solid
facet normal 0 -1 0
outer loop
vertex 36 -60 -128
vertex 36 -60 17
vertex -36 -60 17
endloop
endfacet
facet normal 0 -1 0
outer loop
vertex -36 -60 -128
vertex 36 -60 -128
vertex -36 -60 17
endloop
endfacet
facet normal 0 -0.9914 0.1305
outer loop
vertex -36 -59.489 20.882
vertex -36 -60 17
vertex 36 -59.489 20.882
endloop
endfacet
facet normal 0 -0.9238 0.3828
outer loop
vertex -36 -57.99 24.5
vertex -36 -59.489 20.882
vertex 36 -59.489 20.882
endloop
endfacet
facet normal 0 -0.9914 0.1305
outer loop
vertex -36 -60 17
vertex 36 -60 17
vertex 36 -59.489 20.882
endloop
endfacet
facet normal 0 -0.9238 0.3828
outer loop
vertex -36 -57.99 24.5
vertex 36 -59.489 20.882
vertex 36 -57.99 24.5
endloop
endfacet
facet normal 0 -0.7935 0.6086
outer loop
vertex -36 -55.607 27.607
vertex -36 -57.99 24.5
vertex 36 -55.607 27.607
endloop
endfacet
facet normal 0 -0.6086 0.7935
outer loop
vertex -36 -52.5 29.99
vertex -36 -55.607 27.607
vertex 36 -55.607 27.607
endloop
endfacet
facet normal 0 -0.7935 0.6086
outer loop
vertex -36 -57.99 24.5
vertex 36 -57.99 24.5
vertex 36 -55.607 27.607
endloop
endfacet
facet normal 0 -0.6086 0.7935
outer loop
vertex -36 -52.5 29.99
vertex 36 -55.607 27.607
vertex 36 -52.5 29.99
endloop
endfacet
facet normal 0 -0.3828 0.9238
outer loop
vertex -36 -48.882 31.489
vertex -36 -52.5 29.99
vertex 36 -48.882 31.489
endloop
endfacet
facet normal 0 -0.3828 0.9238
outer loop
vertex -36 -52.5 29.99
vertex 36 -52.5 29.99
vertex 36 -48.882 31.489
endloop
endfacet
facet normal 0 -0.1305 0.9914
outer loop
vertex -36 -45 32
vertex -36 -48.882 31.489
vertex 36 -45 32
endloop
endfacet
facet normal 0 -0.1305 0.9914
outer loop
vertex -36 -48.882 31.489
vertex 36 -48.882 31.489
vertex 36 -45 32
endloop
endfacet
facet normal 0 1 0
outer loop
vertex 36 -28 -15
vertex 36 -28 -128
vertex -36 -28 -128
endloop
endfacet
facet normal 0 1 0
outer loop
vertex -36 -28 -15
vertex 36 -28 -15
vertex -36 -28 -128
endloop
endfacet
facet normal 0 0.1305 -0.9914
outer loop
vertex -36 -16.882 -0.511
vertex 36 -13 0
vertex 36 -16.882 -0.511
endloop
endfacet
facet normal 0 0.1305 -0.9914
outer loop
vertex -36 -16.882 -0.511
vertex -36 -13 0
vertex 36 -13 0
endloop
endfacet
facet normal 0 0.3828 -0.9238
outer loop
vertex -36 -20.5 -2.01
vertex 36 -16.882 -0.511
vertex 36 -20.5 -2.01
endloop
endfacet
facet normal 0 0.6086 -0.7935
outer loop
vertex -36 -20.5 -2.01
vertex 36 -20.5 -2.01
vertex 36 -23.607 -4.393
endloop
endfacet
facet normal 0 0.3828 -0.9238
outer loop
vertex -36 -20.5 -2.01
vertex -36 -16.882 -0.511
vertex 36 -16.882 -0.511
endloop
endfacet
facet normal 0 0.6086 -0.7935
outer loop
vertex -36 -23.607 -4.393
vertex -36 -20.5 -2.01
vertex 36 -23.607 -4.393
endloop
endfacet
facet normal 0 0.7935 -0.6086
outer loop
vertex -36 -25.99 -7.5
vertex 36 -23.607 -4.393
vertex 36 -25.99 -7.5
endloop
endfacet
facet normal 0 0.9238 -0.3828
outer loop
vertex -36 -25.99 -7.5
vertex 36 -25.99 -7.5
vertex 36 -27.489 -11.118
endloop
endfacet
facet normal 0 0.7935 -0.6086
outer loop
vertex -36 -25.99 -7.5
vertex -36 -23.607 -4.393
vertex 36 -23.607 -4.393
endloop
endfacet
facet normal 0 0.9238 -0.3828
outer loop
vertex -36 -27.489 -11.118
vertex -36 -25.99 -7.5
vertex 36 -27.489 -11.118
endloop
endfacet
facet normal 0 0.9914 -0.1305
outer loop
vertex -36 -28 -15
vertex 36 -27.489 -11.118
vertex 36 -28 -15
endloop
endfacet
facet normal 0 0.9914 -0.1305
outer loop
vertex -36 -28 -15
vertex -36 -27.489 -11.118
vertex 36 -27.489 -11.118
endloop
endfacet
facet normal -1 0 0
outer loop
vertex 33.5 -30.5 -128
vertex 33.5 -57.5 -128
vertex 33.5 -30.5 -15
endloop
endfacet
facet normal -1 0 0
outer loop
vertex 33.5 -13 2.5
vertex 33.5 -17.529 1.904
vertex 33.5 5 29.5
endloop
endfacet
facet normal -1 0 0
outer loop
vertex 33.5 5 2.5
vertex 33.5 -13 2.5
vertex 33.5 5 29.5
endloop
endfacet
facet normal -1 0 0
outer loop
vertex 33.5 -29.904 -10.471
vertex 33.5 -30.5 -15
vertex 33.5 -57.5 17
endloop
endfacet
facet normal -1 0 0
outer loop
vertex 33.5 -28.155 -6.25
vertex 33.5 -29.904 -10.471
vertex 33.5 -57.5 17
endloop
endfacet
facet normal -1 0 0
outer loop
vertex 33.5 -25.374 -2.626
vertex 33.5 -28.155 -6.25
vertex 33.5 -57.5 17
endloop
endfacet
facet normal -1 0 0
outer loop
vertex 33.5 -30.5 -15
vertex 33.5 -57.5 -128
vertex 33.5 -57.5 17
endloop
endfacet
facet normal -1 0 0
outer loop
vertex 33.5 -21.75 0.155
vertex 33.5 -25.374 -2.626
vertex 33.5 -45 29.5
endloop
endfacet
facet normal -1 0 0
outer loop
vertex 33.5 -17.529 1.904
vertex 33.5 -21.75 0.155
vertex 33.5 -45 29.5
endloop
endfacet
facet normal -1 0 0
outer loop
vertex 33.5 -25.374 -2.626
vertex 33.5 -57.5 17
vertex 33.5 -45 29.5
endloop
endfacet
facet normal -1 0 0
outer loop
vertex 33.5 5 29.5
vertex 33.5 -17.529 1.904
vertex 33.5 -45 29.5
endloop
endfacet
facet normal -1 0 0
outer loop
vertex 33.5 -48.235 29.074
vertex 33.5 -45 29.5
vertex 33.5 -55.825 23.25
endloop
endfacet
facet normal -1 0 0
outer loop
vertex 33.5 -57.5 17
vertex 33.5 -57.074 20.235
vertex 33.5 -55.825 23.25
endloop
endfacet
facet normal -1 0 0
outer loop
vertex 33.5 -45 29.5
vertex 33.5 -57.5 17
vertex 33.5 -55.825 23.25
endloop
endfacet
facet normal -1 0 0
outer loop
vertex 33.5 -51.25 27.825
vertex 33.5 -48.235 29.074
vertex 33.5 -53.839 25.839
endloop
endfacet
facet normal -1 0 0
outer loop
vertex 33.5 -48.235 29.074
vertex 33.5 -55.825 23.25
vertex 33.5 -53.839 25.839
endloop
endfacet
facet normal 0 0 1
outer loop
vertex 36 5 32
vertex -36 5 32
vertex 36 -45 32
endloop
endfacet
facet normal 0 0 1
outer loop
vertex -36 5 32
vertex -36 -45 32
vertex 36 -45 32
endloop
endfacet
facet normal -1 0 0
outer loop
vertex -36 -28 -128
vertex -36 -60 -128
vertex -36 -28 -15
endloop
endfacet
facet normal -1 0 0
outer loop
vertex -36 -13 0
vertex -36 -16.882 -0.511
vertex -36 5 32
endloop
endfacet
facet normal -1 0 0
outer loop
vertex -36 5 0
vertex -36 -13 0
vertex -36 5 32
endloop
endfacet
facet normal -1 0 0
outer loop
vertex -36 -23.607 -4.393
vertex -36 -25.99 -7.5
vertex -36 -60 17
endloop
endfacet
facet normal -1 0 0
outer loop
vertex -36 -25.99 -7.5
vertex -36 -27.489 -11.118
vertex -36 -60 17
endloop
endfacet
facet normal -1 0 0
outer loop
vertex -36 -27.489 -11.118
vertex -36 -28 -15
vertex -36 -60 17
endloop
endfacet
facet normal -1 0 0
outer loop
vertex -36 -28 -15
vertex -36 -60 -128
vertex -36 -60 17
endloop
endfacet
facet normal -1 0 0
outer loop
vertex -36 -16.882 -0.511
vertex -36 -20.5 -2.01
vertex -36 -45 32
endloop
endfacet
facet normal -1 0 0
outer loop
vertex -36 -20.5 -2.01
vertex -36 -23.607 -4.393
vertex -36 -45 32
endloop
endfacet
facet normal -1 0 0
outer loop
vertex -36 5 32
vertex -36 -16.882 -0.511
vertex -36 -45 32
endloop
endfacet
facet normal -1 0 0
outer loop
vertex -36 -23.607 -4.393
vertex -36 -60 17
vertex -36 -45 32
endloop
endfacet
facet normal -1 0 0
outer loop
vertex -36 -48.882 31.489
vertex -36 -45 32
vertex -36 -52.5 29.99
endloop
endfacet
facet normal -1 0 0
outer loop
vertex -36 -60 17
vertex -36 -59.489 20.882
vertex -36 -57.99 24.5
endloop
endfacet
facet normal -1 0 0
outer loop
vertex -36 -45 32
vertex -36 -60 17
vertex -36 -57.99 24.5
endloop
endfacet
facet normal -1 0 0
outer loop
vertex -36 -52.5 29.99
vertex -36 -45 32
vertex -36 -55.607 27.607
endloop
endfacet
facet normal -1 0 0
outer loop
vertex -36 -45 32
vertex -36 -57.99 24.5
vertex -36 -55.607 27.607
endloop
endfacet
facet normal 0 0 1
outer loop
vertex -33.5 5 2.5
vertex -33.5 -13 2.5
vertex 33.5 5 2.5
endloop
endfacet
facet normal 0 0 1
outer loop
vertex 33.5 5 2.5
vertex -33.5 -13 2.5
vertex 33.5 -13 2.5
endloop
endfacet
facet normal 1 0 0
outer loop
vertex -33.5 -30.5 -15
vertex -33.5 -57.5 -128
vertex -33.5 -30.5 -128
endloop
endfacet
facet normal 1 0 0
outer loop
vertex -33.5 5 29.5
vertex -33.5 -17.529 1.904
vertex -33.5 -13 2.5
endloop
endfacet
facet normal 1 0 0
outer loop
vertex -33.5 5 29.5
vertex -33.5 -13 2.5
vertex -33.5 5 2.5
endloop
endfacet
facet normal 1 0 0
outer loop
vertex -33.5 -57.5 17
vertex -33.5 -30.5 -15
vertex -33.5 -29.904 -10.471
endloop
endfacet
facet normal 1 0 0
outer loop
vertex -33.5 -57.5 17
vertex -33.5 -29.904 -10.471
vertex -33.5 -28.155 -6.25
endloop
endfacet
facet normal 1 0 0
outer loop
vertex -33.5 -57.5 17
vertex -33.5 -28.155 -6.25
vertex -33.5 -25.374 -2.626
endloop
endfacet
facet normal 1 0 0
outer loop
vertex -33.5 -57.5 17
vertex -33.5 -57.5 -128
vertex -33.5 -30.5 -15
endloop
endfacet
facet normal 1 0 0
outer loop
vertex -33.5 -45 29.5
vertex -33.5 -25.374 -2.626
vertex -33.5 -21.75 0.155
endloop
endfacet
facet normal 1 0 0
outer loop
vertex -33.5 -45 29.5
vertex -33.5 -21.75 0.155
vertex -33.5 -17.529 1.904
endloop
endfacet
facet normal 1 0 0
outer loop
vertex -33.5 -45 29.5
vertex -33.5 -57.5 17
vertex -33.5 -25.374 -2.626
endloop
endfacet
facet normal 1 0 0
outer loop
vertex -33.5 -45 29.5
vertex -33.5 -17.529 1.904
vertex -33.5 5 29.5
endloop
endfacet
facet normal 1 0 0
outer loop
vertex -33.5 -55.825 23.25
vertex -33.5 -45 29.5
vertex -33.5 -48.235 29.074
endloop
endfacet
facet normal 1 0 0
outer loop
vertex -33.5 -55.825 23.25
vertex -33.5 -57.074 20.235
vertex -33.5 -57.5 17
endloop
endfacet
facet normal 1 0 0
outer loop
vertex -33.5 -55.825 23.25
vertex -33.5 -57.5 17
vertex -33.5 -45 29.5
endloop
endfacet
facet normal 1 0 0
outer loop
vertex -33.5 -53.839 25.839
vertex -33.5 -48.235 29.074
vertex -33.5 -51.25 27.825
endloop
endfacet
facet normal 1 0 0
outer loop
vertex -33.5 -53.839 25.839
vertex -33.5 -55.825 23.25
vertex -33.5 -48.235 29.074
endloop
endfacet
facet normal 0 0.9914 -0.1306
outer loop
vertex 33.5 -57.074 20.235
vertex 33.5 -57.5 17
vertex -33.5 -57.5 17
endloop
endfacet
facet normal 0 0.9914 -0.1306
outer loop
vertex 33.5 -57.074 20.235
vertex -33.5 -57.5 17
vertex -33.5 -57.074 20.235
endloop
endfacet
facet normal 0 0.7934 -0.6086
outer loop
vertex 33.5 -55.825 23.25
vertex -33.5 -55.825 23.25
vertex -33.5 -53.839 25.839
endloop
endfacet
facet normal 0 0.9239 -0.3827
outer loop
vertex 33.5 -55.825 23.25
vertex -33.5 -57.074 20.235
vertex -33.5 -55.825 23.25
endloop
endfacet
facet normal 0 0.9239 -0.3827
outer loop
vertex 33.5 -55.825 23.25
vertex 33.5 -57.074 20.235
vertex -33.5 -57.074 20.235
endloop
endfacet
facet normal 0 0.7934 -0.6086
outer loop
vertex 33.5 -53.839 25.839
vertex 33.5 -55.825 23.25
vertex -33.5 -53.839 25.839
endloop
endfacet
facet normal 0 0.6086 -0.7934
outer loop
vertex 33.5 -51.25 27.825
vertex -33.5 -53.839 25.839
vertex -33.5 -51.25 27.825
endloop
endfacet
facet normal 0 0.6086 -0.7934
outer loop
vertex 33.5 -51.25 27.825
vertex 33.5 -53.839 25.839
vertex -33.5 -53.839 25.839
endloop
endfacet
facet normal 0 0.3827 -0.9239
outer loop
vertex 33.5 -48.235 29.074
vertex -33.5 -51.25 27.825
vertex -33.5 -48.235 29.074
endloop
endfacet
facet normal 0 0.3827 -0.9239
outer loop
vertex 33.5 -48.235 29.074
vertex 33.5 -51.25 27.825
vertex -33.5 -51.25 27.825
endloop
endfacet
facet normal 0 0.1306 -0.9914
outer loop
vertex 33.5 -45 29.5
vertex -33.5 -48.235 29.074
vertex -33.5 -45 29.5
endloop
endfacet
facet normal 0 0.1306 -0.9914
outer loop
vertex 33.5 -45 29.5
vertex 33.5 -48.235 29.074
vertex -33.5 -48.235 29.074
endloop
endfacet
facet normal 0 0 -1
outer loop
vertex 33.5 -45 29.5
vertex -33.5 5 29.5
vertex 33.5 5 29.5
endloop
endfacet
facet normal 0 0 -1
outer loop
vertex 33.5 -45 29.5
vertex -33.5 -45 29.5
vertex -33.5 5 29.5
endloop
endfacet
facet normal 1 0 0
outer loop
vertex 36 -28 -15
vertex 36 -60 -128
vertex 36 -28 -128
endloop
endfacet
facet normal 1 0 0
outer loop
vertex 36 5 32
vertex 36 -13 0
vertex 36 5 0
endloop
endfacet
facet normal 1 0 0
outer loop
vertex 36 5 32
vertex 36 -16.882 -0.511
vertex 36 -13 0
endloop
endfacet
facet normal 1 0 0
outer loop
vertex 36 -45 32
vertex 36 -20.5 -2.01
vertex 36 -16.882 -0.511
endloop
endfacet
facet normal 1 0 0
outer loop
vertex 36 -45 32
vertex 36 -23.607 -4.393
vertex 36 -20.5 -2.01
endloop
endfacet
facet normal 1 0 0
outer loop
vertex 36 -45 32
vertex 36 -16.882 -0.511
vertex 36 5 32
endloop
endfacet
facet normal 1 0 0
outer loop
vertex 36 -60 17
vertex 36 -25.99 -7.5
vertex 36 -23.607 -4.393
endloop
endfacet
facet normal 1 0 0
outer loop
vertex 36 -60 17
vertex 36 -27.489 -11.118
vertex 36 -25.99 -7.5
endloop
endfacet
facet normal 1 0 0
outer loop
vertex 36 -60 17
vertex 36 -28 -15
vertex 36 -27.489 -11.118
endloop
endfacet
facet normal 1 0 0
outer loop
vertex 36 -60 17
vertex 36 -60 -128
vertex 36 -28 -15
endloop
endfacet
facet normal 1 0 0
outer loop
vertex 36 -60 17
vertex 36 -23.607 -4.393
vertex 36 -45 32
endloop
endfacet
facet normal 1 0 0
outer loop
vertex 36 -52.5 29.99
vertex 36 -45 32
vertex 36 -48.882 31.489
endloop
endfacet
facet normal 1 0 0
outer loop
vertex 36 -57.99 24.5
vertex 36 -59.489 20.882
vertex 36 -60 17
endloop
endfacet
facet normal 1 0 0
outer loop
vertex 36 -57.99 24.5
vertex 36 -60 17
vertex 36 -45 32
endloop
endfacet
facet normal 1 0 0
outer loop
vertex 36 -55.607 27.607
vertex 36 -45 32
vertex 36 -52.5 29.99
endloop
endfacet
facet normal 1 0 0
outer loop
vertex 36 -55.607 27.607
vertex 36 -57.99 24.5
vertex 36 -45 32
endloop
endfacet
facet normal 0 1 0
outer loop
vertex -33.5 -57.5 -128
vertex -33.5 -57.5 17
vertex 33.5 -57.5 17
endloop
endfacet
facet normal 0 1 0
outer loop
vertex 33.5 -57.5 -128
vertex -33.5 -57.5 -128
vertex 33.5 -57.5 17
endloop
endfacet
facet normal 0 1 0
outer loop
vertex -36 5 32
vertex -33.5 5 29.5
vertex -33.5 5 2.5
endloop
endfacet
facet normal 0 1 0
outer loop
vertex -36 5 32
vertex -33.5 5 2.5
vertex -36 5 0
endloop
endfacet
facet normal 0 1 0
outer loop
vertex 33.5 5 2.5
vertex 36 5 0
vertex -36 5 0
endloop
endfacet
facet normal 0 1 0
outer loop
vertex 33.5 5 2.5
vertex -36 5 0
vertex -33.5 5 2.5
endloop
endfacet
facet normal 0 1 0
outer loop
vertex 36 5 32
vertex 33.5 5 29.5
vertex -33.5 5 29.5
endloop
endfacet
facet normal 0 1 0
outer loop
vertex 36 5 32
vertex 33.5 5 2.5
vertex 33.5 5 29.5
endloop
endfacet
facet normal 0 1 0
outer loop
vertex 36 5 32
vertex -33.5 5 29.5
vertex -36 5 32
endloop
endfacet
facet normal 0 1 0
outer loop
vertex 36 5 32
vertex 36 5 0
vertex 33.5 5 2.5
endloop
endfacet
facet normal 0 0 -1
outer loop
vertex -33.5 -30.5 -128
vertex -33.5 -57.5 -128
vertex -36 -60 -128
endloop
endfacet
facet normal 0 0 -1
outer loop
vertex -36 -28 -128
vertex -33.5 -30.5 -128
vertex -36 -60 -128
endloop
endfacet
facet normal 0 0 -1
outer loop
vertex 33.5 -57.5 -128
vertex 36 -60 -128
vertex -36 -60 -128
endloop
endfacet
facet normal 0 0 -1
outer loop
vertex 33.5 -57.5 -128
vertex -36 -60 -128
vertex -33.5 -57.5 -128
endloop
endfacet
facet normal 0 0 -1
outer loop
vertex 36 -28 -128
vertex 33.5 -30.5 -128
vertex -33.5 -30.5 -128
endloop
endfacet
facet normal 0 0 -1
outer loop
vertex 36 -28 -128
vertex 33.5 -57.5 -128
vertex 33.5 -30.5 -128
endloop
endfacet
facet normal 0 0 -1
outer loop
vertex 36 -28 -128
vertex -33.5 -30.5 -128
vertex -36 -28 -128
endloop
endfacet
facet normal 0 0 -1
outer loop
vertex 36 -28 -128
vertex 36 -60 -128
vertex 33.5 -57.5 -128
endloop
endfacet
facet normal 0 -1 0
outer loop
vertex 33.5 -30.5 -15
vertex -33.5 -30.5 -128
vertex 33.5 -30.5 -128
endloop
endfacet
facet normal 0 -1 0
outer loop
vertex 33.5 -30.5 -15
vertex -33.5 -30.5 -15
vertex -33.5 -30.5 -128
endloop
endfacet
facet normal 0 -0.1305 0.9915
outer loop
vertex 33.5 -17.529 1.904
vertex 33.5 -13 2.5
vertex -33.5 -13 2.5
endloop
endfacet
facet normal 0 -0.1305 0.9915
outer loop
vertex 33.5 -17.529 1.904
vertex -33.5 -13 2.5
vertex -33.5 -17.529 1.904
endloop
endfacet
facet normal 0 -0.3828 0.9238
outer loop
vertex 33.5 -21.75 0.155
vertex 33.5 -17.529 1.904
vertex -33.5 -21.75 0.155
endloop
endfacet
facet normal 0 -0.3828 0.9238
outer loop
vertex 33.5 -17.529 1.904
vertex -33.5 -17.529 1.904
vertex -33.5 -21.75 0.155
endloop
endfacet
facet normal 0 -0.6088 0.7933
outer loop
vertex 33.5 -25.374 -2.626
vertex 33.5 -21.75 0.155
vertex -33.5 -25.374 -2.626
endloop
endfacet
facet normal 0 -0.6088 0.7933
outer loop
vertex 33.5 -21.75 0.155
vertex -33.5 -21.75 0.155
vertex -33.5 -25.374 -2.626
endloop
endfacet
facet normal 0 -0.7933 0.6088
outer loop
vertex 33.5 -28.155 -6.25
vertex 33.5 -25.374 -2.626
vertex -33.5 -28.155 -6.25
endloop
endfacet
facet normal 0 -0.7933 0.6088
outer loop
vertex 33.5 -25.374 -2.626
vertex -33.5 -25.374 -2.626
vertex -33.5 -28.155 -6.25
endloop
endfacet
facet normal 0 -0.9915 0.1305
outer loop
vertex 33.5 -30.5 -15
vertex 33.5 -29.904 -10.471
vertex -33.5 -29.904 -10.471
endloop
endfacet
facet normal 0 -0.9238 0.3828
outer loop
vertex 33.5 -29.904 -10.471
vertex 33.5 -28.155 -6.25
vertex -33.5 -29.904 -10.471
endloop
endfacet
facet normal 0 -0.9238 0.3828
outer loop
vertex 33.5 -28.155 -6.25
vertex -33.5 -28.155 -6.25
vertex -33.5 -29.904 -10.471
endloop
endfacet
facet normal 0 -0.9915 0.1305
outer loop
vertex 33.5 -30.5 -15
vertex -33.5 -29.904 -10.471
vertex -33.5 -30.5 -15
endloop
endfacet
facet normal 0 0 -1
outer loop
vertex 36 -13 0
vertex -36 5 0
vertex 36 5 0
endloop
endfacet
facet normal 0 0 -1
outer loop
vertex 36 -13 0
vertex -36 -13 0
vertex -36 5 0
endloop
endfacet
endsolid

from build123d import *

# Parameters (mm, degrees)
F1_DEPTH = 36
F2_R     = 15
F3_T     = -2.5
F4_W     = 67
F4_H     = 27
F5_DEPTH = 3
F6_DEPTH = 100
F7_DEPTH = 5


with BuildPart() as f1:
    # F0 (on Right) → F1 (new body, symmetric)
    with BuildSketch(Plane.YZ):
        Polygon((-28, 0), (0, 0), (0, 32), (-60, 32), (-60, 0), (-60, -28), (-28, -28), align=None)
    extrude(amount=F1_DEPTH, both=True)

    # F2
    f2_edges = [f1.edges().sort_by_distance(p)[0] for p in [
        (0, -60, 32),
        (0, -28, 0),
    ]]
    fillet(f2_edges, radius=F2_R)

    # F3
    f3_openings = [f1.faces().sort_by_distance(p)[0] for p in [
        (0, 0, 16),
    ]]
    offset(amount=F3_T, openings=f3_openings)

    # F4 (on face) → F5 (cut)
    with BuildSketch(Plane(origin=(0, 0, -28), x_dir=(1, 0, 0), z_dir=(0, 0, -1))):
        with Locations((0, 44)):
            Rectangle(F4_W, F4_H)
    extrude(amount=-F5_DEPTH, mode=Mode.SUBTRACT)

    # F6 (add): a face of the model
    f6_faces = [f1.faces().sort_by_distance(p)[0] for p in [
        (-35.2120913759, -44, -28),
    ]]
    extrude(f6_faces, amount=F6_DEPTH)

    # F7 (add): a face of the model
    f7_faces = [f1.faces().sort_by_distance(p)[0] for p in [
        (0, 0, 0.7879086241),
    ]]
    extrude(f7_faces, amount=F7_DEPTH)


solid = f1.part
